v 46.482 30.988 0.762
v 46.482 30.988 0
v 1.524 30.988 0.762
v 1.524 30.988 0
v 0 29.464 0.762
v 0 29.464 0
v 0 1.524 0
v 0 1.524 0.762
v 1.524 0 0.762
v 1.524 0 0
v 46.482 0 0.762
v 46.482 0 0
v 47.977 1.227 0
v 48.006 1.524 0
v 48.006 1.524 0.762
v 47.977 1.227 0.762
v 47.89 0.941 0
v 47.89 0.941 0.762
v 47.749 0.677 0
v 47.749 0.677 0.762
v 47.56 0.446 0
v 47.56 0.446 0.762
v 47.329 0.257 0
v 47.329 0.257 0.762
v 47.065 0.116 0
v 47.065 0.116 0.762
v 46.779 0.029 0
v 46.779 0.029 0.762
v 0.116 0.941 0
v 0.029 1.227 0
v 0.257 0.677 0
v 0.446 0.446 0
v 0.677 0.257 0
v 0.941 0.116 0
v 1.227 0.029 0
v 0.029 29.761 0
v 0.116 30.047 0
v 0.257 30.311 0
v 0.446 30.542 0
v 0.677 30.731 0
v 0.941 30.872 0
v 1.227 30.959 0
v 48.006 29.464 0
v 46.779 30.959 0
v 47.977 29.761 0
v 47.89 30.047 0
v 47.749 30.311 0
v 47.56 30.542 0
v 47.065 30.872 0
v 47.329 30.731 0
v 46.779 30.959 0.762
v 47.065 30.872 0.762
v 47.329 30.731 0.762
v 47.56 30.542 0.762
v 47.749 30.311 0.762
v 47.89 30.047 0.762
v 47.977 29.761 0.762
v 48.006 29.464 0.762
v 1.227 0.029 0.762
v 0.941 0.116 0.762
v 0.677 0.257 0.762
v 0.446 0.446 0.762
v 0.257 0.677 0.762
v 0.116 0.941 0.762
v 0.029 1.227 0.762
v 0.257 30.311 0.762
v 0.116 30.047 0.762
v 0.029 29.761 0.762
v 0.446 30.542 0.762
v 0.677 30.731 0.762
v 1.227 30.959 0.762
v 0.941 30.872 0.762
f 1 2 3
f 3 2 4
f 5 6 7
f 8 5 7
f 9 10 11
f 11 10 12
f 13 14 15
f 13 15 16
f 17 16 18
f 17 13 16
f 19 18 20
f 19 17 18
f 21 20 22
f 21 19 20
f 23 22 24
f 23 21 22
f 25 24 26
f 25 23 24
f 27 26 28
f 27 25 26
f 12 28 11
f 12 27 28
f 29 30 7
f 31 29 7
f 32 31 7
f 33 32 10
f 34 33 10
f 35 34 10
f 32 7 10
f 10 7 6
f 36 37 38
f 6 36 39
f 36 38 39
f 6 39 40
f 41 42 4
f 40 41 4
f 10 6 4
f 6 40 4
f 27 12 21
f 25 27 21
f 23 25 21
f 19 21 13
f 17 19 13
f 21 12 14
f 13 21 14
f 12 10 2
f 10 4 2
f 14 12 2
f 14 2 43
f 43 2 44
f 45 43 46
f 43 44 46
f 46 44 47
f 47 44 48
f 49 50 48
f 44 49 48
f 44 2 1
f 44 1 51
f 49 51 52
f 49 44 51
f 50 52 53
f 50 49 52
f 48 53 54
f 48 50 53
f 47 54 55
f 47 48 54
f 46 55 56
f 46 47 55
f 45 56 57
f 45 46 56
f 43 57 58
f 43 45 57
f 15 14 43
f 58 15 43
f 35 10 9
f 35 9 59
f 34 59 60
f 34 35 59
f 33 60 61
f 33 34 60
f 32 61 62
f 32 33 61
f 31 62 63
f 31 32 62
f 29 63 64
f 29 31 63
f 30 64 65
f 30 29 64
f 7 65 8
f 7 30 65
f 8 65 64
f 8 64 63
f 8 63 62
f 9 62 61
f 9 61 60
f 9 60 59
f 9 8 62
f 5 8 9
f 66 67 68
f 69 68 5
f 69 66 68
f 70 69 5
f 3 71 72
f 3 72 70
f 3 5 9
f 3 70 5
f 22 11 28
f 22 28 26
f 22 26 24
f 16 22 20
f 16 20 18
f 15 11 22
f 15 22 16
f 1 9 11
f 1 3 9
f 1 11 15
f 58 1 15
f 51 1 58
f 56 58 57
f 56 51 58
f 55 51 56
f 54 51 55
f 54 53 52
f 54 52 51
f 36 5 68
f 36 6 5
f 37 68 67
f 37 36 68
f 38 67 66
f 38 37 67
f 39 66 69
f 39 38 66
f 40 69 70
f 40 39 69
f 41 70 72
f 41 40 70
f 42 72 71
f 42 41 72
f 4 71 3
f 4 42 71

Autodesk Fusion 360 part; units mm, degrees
sketch "Sketch1" plane through (0, 0, 0) normal (0, 0, 1) x (1, 0, 0)
  line L0 (1.524, 0) -> (46.482, 0)
  line L1 (48.006, 1.524) -> (48.006, 29.464)
  line L2 (46.482, 30.988) -> (1.524, 30.988)
  line L3 (0, 29.464) -> (0, 1.524)
  arc A0 (1.524, 30.988) -> (0, 29.464) centre (1.524, 29.464) ccw
  arc A1 (0, 1.524) -> (1.524, 0) centre (1.524, 1.524) ccw
  arc A2 (48.006, 29.464) -> (46.482, 30.988) centre (46.482, 29.464) ccw
  arc A3 (46.482, 0) -> (48.006, 1.524) centre (46.482, 1.524) ccw
  point P0 (48.006, 0)
  point P1 (0, 30.988)
  dimension "d1" = 48.006
  dimension "d2" = 30.988
  dimension "d5" = 1.524
  dimension "d6" = 1.524
  dimension "d7" = 1.524
  dimension "d8" = 1.524
extrude "Extrude1" add sketch "Sketch1" along normal blind 0.762
